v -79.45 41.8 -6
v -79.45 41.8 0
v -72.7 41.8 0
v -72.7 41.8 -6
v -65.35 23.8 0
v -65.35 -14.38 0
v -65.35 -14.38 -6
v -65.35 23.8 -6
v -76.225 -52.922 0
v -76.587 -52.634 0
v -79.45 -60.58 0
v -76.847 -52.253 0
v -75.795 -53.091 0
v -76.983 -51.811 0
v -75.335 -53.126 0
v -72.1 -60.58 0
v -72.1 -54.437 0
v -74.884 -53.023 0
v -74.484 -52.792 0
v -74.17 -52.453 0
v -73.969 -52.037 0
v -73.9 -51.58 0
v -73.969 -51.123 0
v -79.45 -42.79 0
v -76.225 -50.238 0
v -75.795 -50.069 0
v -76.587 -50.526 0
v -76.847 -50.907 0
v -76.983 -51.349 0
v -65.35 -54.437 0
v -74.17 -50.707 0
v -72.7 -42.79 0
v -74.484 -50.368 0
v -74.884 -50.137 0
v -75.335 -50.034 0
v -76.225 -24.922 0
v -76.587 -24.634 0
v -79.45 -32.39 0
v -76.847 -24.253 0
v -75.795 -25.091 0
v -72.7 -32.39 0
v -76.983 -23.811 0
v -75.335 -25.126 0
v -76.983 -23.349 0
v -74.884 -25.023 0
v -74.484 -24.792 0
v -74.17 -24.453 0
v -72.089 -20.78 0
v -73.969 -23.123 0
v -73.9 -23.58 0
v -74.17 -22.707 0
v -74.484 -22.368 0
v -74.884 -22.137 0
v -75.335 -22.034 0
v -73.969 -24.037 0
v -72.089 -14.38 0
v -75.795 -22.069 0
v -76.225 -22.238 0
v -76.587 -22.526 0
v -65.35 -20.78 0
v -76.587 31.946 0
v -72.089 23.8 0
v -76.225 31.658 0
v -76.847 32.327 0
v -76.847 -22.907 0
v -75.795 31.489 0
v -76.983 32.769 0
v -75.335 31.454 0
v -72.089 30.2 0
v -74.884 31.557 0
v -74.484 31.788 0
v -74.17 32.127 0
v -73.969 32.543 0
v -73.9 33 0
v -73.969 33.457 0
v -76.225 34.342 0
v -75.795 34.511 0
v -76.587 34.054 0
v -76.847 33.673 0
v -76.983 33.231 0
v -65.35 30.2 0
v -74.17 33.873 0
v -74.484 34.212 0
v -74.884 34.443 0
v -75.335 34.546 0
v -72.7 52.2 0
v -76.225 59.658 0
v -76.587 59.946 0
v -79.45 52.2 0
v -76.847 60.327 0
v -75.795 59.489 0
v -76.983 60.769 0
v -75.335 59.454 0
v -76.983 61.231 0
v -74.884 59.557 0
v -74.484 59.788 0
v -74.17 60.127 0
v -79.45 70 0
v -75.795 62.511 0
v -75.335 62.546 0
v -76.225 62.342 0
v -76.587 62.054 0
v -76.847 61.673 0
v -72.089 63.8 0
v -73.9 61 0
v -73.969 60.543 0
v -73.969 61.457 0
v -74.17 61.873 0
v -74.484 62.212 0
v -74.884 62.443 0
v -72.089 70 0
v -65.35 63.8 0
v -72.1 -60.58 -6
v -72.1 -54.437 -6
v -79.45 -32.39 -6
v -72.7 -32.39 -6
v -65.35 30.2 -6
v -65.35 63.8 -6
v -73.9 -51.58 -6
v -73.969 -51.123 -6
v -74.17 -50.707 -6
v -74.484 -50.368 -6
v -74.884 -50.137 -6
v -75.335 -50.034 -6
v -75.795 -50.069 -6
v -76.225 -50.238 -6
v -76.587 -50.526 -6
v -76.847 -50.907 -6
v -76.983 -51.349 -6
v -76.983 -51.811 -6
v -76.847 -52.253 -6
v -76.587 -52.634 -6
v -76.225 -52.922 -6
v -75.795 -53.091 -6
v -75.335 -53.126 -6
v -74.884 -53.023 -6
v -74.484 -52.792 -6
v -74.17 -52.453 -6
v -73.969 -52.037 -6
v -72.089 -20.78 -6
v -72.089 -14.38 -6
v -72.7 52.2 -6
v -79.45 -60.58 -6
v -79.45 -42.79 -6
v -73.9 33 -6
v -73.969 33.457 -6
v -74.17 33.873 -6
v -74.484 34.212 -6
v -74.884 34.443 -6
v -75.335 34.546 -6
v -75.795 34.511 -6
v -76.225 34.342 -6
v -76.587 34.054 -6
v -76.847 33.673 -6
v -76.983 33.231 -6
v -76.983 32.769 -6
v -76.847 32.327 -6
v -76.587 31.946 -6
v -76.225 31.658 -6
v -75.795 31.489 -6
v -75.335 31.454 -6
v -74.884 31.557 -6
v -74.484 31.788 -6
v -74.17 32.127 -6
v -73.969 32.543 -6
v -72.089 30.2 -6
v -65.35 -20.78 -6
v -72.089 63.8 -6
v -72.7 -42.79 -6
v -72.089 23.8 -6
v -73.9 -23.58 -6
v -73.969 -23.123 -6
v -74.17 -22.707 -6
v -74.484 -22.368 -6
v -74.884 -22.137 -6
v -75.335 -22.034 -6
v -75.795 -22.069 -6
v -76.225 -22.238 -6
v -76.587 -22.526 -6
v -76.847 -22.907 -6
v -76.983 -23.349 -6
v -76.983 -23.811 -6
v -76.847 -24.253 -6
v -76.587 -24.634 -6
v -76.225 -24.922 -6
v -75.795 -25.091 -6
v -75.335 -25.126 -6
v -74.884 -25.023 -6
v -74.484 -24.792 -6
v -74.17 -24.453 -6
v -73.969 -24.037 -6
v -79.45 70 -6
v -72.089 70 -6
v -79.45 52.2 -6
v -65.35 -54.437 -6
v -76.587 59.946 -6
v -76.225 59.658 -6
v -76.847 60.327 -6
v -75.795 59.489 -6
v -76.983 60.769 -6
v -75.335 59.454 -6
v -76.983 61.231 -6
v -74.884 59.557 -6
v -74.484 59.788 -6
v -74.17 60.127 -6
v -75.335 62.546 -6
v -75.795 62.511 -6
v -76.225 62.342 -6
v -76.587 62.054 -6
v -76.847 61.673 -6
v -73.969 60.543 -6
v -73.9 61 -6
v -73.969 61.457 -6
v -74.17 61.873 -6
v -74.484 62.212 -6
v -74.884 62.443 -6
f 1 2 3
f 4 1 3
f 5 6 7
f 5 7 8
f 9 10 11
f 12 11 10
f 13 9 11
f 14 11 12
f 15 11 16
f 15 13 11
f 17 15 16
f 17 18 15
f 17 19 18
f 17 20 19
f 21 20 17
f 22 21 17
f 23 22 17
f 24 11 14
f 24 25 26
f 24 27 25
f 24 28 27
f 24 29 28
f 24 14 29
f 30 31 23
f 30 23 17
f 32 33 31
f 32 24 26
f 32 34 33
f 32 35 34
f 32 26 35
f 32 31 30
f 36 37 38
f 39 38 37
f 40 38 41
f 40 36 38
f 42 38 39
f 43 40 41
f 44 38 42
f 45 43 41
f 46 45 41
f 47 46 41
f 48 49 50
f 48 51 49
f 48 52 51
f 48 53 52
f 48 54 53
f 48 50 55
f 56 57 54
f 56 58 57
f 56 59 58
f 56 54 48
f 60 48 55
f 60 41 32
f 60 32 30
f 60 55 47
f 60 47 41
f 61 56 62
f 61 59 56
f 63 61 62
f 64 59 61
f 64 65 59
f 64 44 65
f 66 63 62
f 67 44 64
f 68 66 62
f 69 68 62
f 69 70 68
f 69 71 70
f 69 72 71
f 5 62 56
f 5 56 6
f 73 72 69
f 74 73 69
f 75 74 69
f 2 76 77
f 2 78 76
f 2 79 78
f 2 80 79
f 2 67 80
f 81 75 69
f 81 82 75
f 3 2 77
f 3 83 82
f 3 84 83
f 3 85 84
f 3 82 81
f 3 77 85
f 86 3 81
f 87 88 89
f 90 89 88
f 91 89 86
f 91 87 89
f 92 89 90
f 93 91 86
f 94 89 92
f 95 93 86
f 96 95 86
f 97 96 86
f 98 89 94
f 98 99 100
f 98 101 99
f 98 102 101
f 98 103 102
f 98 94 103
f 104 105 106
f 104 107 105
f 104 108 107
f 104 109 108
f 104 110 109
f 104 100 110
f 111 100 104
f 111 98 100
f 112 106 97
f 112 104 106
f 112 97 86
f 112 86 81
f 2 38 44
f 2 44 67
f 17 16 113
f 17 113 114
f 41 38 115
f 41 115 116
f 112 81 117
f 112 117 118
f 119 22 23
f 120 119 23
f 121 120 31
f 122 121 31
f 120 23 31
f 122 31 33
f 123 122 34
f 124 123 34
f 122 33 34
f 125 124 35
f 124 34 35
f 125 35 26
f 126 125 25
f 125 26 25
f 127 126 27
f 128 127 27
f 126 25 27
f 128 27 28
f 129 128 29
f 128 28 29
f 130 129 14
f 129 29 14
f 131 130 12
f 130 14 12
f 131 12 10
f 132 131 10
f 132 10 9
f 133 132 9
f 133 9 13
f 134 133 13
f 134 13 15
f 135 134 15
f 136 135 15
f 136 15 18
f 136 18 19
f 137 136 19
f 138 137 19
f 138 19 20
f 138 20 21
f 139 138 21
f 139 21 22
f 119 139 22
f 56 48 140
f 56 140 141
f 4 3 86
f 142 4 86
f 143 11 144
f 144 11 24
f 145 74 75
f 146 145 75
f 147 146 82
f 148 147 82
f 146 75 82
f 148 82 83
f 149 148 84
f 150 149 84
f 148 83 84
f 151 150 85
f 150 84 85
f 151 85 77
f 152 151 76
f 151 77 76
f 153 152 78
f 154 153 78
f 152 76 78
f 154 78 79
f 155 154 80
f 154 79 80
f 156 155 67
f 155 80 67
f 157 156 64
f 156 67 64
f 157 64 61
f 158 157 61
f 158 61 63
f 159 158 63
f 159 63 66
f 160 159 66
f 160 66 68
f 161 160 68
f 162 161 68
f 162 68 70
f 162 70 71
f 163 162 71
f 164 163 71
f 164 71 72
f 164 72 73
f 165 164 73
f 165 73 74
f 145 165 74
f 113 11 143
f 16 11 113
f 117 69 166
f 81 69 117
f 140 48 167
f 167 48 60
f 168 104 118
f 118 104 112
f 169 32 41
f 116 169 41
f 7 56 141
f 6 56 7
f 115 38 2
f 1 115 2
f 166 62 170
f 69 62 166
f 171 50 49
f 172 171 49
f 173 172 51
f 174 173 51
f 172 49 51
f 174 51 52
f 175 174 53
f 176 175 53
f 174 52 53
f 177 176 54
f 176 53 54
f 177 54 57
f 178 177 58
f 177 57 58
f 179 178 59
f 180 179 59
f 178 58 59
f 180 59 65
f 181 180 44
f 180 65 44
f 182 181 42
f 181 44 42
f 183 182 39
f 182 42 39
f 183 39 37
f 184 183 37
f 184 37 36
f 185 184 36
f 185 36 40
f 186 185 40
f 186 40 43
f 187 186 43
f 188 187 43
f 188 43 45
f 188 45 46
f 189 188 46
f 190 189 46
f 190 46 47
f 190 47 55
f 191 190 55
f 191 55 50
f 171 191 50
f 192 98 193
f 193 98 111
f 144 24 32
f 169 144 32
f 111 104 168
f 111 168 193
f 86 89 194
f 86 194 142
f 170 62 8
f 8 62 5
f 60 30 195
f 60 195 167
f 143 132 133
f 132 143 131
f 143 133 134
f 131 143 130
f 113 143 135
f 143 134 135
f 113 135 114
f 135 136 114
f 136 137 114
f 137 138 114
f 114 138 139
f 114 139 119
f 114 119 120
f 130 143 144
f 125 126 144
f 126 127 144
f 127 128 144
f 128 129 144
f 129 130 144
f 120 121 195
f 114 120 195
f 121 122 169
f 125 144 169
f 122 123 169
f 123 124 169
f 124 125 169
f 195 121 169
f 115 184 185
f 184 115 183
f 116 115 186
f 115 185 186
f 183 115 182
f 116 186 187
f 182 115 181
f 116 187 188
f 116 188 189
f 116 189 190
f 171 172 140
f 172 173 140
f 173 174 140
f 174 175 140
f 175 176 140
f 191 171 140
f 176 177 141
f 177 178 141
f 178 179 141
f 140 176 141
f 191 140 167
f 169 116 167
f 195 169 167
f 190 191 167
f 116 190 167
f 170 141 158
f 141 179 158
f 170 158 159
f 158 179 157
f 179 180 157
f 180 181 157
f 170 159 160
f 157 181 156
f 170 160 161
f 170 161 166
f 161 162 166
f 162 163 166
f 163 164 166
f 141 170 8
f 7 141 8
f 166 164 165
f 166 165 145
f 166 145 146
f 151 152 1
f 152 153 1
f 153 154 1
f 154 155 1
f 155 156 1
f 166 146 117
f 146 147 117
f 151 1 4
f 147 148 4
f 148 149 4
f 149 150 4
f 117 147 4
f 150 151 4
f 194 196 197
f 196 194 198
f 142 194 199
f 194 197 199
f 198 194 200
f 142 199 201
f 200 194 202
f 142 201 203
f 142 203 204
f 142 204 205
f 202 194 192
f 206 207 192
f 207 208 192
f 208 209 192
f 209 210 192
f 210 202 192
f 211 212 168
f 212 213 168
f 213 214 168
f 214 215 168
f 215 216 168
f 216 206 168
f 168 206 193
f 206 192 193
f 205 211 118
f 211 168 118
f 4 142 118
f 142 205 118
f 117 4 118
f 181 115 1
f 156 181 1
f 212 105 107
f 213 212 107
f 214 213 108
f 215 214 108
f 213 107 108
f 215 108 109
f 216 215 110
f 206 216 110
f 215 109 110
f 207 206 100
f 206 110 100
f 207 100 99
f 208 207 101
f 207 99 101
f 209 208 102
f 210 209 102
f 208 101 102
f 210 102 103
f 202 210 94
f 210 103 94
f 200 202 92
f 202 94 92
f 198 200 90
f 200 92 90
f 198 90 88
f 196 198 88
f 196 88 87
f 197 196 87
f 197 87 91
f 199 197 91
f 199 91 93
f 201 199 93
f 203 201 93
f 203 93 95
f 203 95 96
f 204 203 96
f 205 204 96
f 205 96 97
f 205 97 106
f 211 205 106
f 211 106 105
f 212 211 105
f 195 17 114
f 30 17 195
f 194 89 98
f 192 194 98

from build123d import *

# Parameters (mm, degrees)
SZKIC1_W                    = 14.1
SZKIC1_H                    = 136.58
DODANIE_WYCI_GNI_CIE1_DEPTH = 6
PRZENIE_CIAN_1_BY           = 6
SZKIC3_W                    = 6.75
SZKIC3_H                    = 10.4
SZKIC3_W_2                  = 6.95
SZKIC3_H_2                  = 6.4
SZKIC3_H_3                  = 6.342942851
WYTNIJ_WYCI_GNI_CIE1_DEPTH  = 107.058352026
SZKIC4_R                    = 1.55
WYTNIJ_WYCI_GNI_CIE2_DEPTH  = 107.058352026


with BuildPart() as part:
    # Szkic1 → Dodanie-wyciągnięcie1 (new body)
    with BuildSketch(Plane.XY):
        with Locations((-72.400450183, 1.710000001)):
            Rectangle(SZKIC1_W, SZKIC1_H)
    extrude(amount=-DODANIE_WYCI_GNI_CIE1_DEPTH)

    # Przenieś ścianę1: a face moved inward by 6.0
    extrude(part.faces().sort_by_distance((-72.400450183, -66.579999999, -3))[0], amount=PRZENIE_CIAN_1_BY, dir=(0, 1, 0), mode=Mode.SUBTRACT)

    # Szkic3 → Wytnij-wyciągnięcie1 (cut, through all)
    with BuildSketch(Plane.XY):
        with Locations((-76.075450183, 47.000000001)):
            Rectangle(SZKIC3_W, SZKIC3_H)
        with Locations((-76.075450183, -37.590311699)):
            Rectangle(SZKIC3_W, SZKIC3_H)
        with Locations((-68.613894602, 67.000000001)):
            Rectangle(SZKIC3_W_2, SZKIC3_H_2)
        with Locations((-68.613894602, 27.000000001)):
            Rectangle(SZKIC3_W_2, SZKIC3_H_2)
        with Locations((-68.625450183, -57.608528574)):
            Rectangle(SZKIC3_W_2, SZKIC3_H_3)
        with Locations((-68.613894602, -17.579999999)):
            Rectangle(SZKIC3_W_2, SZKIC3_H_2)
    extrude(amount=-WYTNIJ_WYCI_GNI_CIE1_DEPTH, mode=Mode.SUBTRACT)

    # Szkic4 → Wytnij-wyciągnięcie2 (cut, through all)
    with BuildSketch(Plane.XY):
        with Locations((-75.450450183, 61.000000001)):
            Circle(SZKIC4_R)
        with Locations((-75.450450183, -51.579999999)):
            Circle(SZKIC4_R)
        with Locations((-75.450450183, 33.000000001)):
            Circle(SZKIC4_R)
        with Locations((-75.450450183, -23.579999999)):
            Circle(SZKIC4_R)
    extrude(amount=-WYTNIJ_WYCI_GNI_CIE2_DEPTH, mode=Mode.SUBTRACT)


solid = part.part
